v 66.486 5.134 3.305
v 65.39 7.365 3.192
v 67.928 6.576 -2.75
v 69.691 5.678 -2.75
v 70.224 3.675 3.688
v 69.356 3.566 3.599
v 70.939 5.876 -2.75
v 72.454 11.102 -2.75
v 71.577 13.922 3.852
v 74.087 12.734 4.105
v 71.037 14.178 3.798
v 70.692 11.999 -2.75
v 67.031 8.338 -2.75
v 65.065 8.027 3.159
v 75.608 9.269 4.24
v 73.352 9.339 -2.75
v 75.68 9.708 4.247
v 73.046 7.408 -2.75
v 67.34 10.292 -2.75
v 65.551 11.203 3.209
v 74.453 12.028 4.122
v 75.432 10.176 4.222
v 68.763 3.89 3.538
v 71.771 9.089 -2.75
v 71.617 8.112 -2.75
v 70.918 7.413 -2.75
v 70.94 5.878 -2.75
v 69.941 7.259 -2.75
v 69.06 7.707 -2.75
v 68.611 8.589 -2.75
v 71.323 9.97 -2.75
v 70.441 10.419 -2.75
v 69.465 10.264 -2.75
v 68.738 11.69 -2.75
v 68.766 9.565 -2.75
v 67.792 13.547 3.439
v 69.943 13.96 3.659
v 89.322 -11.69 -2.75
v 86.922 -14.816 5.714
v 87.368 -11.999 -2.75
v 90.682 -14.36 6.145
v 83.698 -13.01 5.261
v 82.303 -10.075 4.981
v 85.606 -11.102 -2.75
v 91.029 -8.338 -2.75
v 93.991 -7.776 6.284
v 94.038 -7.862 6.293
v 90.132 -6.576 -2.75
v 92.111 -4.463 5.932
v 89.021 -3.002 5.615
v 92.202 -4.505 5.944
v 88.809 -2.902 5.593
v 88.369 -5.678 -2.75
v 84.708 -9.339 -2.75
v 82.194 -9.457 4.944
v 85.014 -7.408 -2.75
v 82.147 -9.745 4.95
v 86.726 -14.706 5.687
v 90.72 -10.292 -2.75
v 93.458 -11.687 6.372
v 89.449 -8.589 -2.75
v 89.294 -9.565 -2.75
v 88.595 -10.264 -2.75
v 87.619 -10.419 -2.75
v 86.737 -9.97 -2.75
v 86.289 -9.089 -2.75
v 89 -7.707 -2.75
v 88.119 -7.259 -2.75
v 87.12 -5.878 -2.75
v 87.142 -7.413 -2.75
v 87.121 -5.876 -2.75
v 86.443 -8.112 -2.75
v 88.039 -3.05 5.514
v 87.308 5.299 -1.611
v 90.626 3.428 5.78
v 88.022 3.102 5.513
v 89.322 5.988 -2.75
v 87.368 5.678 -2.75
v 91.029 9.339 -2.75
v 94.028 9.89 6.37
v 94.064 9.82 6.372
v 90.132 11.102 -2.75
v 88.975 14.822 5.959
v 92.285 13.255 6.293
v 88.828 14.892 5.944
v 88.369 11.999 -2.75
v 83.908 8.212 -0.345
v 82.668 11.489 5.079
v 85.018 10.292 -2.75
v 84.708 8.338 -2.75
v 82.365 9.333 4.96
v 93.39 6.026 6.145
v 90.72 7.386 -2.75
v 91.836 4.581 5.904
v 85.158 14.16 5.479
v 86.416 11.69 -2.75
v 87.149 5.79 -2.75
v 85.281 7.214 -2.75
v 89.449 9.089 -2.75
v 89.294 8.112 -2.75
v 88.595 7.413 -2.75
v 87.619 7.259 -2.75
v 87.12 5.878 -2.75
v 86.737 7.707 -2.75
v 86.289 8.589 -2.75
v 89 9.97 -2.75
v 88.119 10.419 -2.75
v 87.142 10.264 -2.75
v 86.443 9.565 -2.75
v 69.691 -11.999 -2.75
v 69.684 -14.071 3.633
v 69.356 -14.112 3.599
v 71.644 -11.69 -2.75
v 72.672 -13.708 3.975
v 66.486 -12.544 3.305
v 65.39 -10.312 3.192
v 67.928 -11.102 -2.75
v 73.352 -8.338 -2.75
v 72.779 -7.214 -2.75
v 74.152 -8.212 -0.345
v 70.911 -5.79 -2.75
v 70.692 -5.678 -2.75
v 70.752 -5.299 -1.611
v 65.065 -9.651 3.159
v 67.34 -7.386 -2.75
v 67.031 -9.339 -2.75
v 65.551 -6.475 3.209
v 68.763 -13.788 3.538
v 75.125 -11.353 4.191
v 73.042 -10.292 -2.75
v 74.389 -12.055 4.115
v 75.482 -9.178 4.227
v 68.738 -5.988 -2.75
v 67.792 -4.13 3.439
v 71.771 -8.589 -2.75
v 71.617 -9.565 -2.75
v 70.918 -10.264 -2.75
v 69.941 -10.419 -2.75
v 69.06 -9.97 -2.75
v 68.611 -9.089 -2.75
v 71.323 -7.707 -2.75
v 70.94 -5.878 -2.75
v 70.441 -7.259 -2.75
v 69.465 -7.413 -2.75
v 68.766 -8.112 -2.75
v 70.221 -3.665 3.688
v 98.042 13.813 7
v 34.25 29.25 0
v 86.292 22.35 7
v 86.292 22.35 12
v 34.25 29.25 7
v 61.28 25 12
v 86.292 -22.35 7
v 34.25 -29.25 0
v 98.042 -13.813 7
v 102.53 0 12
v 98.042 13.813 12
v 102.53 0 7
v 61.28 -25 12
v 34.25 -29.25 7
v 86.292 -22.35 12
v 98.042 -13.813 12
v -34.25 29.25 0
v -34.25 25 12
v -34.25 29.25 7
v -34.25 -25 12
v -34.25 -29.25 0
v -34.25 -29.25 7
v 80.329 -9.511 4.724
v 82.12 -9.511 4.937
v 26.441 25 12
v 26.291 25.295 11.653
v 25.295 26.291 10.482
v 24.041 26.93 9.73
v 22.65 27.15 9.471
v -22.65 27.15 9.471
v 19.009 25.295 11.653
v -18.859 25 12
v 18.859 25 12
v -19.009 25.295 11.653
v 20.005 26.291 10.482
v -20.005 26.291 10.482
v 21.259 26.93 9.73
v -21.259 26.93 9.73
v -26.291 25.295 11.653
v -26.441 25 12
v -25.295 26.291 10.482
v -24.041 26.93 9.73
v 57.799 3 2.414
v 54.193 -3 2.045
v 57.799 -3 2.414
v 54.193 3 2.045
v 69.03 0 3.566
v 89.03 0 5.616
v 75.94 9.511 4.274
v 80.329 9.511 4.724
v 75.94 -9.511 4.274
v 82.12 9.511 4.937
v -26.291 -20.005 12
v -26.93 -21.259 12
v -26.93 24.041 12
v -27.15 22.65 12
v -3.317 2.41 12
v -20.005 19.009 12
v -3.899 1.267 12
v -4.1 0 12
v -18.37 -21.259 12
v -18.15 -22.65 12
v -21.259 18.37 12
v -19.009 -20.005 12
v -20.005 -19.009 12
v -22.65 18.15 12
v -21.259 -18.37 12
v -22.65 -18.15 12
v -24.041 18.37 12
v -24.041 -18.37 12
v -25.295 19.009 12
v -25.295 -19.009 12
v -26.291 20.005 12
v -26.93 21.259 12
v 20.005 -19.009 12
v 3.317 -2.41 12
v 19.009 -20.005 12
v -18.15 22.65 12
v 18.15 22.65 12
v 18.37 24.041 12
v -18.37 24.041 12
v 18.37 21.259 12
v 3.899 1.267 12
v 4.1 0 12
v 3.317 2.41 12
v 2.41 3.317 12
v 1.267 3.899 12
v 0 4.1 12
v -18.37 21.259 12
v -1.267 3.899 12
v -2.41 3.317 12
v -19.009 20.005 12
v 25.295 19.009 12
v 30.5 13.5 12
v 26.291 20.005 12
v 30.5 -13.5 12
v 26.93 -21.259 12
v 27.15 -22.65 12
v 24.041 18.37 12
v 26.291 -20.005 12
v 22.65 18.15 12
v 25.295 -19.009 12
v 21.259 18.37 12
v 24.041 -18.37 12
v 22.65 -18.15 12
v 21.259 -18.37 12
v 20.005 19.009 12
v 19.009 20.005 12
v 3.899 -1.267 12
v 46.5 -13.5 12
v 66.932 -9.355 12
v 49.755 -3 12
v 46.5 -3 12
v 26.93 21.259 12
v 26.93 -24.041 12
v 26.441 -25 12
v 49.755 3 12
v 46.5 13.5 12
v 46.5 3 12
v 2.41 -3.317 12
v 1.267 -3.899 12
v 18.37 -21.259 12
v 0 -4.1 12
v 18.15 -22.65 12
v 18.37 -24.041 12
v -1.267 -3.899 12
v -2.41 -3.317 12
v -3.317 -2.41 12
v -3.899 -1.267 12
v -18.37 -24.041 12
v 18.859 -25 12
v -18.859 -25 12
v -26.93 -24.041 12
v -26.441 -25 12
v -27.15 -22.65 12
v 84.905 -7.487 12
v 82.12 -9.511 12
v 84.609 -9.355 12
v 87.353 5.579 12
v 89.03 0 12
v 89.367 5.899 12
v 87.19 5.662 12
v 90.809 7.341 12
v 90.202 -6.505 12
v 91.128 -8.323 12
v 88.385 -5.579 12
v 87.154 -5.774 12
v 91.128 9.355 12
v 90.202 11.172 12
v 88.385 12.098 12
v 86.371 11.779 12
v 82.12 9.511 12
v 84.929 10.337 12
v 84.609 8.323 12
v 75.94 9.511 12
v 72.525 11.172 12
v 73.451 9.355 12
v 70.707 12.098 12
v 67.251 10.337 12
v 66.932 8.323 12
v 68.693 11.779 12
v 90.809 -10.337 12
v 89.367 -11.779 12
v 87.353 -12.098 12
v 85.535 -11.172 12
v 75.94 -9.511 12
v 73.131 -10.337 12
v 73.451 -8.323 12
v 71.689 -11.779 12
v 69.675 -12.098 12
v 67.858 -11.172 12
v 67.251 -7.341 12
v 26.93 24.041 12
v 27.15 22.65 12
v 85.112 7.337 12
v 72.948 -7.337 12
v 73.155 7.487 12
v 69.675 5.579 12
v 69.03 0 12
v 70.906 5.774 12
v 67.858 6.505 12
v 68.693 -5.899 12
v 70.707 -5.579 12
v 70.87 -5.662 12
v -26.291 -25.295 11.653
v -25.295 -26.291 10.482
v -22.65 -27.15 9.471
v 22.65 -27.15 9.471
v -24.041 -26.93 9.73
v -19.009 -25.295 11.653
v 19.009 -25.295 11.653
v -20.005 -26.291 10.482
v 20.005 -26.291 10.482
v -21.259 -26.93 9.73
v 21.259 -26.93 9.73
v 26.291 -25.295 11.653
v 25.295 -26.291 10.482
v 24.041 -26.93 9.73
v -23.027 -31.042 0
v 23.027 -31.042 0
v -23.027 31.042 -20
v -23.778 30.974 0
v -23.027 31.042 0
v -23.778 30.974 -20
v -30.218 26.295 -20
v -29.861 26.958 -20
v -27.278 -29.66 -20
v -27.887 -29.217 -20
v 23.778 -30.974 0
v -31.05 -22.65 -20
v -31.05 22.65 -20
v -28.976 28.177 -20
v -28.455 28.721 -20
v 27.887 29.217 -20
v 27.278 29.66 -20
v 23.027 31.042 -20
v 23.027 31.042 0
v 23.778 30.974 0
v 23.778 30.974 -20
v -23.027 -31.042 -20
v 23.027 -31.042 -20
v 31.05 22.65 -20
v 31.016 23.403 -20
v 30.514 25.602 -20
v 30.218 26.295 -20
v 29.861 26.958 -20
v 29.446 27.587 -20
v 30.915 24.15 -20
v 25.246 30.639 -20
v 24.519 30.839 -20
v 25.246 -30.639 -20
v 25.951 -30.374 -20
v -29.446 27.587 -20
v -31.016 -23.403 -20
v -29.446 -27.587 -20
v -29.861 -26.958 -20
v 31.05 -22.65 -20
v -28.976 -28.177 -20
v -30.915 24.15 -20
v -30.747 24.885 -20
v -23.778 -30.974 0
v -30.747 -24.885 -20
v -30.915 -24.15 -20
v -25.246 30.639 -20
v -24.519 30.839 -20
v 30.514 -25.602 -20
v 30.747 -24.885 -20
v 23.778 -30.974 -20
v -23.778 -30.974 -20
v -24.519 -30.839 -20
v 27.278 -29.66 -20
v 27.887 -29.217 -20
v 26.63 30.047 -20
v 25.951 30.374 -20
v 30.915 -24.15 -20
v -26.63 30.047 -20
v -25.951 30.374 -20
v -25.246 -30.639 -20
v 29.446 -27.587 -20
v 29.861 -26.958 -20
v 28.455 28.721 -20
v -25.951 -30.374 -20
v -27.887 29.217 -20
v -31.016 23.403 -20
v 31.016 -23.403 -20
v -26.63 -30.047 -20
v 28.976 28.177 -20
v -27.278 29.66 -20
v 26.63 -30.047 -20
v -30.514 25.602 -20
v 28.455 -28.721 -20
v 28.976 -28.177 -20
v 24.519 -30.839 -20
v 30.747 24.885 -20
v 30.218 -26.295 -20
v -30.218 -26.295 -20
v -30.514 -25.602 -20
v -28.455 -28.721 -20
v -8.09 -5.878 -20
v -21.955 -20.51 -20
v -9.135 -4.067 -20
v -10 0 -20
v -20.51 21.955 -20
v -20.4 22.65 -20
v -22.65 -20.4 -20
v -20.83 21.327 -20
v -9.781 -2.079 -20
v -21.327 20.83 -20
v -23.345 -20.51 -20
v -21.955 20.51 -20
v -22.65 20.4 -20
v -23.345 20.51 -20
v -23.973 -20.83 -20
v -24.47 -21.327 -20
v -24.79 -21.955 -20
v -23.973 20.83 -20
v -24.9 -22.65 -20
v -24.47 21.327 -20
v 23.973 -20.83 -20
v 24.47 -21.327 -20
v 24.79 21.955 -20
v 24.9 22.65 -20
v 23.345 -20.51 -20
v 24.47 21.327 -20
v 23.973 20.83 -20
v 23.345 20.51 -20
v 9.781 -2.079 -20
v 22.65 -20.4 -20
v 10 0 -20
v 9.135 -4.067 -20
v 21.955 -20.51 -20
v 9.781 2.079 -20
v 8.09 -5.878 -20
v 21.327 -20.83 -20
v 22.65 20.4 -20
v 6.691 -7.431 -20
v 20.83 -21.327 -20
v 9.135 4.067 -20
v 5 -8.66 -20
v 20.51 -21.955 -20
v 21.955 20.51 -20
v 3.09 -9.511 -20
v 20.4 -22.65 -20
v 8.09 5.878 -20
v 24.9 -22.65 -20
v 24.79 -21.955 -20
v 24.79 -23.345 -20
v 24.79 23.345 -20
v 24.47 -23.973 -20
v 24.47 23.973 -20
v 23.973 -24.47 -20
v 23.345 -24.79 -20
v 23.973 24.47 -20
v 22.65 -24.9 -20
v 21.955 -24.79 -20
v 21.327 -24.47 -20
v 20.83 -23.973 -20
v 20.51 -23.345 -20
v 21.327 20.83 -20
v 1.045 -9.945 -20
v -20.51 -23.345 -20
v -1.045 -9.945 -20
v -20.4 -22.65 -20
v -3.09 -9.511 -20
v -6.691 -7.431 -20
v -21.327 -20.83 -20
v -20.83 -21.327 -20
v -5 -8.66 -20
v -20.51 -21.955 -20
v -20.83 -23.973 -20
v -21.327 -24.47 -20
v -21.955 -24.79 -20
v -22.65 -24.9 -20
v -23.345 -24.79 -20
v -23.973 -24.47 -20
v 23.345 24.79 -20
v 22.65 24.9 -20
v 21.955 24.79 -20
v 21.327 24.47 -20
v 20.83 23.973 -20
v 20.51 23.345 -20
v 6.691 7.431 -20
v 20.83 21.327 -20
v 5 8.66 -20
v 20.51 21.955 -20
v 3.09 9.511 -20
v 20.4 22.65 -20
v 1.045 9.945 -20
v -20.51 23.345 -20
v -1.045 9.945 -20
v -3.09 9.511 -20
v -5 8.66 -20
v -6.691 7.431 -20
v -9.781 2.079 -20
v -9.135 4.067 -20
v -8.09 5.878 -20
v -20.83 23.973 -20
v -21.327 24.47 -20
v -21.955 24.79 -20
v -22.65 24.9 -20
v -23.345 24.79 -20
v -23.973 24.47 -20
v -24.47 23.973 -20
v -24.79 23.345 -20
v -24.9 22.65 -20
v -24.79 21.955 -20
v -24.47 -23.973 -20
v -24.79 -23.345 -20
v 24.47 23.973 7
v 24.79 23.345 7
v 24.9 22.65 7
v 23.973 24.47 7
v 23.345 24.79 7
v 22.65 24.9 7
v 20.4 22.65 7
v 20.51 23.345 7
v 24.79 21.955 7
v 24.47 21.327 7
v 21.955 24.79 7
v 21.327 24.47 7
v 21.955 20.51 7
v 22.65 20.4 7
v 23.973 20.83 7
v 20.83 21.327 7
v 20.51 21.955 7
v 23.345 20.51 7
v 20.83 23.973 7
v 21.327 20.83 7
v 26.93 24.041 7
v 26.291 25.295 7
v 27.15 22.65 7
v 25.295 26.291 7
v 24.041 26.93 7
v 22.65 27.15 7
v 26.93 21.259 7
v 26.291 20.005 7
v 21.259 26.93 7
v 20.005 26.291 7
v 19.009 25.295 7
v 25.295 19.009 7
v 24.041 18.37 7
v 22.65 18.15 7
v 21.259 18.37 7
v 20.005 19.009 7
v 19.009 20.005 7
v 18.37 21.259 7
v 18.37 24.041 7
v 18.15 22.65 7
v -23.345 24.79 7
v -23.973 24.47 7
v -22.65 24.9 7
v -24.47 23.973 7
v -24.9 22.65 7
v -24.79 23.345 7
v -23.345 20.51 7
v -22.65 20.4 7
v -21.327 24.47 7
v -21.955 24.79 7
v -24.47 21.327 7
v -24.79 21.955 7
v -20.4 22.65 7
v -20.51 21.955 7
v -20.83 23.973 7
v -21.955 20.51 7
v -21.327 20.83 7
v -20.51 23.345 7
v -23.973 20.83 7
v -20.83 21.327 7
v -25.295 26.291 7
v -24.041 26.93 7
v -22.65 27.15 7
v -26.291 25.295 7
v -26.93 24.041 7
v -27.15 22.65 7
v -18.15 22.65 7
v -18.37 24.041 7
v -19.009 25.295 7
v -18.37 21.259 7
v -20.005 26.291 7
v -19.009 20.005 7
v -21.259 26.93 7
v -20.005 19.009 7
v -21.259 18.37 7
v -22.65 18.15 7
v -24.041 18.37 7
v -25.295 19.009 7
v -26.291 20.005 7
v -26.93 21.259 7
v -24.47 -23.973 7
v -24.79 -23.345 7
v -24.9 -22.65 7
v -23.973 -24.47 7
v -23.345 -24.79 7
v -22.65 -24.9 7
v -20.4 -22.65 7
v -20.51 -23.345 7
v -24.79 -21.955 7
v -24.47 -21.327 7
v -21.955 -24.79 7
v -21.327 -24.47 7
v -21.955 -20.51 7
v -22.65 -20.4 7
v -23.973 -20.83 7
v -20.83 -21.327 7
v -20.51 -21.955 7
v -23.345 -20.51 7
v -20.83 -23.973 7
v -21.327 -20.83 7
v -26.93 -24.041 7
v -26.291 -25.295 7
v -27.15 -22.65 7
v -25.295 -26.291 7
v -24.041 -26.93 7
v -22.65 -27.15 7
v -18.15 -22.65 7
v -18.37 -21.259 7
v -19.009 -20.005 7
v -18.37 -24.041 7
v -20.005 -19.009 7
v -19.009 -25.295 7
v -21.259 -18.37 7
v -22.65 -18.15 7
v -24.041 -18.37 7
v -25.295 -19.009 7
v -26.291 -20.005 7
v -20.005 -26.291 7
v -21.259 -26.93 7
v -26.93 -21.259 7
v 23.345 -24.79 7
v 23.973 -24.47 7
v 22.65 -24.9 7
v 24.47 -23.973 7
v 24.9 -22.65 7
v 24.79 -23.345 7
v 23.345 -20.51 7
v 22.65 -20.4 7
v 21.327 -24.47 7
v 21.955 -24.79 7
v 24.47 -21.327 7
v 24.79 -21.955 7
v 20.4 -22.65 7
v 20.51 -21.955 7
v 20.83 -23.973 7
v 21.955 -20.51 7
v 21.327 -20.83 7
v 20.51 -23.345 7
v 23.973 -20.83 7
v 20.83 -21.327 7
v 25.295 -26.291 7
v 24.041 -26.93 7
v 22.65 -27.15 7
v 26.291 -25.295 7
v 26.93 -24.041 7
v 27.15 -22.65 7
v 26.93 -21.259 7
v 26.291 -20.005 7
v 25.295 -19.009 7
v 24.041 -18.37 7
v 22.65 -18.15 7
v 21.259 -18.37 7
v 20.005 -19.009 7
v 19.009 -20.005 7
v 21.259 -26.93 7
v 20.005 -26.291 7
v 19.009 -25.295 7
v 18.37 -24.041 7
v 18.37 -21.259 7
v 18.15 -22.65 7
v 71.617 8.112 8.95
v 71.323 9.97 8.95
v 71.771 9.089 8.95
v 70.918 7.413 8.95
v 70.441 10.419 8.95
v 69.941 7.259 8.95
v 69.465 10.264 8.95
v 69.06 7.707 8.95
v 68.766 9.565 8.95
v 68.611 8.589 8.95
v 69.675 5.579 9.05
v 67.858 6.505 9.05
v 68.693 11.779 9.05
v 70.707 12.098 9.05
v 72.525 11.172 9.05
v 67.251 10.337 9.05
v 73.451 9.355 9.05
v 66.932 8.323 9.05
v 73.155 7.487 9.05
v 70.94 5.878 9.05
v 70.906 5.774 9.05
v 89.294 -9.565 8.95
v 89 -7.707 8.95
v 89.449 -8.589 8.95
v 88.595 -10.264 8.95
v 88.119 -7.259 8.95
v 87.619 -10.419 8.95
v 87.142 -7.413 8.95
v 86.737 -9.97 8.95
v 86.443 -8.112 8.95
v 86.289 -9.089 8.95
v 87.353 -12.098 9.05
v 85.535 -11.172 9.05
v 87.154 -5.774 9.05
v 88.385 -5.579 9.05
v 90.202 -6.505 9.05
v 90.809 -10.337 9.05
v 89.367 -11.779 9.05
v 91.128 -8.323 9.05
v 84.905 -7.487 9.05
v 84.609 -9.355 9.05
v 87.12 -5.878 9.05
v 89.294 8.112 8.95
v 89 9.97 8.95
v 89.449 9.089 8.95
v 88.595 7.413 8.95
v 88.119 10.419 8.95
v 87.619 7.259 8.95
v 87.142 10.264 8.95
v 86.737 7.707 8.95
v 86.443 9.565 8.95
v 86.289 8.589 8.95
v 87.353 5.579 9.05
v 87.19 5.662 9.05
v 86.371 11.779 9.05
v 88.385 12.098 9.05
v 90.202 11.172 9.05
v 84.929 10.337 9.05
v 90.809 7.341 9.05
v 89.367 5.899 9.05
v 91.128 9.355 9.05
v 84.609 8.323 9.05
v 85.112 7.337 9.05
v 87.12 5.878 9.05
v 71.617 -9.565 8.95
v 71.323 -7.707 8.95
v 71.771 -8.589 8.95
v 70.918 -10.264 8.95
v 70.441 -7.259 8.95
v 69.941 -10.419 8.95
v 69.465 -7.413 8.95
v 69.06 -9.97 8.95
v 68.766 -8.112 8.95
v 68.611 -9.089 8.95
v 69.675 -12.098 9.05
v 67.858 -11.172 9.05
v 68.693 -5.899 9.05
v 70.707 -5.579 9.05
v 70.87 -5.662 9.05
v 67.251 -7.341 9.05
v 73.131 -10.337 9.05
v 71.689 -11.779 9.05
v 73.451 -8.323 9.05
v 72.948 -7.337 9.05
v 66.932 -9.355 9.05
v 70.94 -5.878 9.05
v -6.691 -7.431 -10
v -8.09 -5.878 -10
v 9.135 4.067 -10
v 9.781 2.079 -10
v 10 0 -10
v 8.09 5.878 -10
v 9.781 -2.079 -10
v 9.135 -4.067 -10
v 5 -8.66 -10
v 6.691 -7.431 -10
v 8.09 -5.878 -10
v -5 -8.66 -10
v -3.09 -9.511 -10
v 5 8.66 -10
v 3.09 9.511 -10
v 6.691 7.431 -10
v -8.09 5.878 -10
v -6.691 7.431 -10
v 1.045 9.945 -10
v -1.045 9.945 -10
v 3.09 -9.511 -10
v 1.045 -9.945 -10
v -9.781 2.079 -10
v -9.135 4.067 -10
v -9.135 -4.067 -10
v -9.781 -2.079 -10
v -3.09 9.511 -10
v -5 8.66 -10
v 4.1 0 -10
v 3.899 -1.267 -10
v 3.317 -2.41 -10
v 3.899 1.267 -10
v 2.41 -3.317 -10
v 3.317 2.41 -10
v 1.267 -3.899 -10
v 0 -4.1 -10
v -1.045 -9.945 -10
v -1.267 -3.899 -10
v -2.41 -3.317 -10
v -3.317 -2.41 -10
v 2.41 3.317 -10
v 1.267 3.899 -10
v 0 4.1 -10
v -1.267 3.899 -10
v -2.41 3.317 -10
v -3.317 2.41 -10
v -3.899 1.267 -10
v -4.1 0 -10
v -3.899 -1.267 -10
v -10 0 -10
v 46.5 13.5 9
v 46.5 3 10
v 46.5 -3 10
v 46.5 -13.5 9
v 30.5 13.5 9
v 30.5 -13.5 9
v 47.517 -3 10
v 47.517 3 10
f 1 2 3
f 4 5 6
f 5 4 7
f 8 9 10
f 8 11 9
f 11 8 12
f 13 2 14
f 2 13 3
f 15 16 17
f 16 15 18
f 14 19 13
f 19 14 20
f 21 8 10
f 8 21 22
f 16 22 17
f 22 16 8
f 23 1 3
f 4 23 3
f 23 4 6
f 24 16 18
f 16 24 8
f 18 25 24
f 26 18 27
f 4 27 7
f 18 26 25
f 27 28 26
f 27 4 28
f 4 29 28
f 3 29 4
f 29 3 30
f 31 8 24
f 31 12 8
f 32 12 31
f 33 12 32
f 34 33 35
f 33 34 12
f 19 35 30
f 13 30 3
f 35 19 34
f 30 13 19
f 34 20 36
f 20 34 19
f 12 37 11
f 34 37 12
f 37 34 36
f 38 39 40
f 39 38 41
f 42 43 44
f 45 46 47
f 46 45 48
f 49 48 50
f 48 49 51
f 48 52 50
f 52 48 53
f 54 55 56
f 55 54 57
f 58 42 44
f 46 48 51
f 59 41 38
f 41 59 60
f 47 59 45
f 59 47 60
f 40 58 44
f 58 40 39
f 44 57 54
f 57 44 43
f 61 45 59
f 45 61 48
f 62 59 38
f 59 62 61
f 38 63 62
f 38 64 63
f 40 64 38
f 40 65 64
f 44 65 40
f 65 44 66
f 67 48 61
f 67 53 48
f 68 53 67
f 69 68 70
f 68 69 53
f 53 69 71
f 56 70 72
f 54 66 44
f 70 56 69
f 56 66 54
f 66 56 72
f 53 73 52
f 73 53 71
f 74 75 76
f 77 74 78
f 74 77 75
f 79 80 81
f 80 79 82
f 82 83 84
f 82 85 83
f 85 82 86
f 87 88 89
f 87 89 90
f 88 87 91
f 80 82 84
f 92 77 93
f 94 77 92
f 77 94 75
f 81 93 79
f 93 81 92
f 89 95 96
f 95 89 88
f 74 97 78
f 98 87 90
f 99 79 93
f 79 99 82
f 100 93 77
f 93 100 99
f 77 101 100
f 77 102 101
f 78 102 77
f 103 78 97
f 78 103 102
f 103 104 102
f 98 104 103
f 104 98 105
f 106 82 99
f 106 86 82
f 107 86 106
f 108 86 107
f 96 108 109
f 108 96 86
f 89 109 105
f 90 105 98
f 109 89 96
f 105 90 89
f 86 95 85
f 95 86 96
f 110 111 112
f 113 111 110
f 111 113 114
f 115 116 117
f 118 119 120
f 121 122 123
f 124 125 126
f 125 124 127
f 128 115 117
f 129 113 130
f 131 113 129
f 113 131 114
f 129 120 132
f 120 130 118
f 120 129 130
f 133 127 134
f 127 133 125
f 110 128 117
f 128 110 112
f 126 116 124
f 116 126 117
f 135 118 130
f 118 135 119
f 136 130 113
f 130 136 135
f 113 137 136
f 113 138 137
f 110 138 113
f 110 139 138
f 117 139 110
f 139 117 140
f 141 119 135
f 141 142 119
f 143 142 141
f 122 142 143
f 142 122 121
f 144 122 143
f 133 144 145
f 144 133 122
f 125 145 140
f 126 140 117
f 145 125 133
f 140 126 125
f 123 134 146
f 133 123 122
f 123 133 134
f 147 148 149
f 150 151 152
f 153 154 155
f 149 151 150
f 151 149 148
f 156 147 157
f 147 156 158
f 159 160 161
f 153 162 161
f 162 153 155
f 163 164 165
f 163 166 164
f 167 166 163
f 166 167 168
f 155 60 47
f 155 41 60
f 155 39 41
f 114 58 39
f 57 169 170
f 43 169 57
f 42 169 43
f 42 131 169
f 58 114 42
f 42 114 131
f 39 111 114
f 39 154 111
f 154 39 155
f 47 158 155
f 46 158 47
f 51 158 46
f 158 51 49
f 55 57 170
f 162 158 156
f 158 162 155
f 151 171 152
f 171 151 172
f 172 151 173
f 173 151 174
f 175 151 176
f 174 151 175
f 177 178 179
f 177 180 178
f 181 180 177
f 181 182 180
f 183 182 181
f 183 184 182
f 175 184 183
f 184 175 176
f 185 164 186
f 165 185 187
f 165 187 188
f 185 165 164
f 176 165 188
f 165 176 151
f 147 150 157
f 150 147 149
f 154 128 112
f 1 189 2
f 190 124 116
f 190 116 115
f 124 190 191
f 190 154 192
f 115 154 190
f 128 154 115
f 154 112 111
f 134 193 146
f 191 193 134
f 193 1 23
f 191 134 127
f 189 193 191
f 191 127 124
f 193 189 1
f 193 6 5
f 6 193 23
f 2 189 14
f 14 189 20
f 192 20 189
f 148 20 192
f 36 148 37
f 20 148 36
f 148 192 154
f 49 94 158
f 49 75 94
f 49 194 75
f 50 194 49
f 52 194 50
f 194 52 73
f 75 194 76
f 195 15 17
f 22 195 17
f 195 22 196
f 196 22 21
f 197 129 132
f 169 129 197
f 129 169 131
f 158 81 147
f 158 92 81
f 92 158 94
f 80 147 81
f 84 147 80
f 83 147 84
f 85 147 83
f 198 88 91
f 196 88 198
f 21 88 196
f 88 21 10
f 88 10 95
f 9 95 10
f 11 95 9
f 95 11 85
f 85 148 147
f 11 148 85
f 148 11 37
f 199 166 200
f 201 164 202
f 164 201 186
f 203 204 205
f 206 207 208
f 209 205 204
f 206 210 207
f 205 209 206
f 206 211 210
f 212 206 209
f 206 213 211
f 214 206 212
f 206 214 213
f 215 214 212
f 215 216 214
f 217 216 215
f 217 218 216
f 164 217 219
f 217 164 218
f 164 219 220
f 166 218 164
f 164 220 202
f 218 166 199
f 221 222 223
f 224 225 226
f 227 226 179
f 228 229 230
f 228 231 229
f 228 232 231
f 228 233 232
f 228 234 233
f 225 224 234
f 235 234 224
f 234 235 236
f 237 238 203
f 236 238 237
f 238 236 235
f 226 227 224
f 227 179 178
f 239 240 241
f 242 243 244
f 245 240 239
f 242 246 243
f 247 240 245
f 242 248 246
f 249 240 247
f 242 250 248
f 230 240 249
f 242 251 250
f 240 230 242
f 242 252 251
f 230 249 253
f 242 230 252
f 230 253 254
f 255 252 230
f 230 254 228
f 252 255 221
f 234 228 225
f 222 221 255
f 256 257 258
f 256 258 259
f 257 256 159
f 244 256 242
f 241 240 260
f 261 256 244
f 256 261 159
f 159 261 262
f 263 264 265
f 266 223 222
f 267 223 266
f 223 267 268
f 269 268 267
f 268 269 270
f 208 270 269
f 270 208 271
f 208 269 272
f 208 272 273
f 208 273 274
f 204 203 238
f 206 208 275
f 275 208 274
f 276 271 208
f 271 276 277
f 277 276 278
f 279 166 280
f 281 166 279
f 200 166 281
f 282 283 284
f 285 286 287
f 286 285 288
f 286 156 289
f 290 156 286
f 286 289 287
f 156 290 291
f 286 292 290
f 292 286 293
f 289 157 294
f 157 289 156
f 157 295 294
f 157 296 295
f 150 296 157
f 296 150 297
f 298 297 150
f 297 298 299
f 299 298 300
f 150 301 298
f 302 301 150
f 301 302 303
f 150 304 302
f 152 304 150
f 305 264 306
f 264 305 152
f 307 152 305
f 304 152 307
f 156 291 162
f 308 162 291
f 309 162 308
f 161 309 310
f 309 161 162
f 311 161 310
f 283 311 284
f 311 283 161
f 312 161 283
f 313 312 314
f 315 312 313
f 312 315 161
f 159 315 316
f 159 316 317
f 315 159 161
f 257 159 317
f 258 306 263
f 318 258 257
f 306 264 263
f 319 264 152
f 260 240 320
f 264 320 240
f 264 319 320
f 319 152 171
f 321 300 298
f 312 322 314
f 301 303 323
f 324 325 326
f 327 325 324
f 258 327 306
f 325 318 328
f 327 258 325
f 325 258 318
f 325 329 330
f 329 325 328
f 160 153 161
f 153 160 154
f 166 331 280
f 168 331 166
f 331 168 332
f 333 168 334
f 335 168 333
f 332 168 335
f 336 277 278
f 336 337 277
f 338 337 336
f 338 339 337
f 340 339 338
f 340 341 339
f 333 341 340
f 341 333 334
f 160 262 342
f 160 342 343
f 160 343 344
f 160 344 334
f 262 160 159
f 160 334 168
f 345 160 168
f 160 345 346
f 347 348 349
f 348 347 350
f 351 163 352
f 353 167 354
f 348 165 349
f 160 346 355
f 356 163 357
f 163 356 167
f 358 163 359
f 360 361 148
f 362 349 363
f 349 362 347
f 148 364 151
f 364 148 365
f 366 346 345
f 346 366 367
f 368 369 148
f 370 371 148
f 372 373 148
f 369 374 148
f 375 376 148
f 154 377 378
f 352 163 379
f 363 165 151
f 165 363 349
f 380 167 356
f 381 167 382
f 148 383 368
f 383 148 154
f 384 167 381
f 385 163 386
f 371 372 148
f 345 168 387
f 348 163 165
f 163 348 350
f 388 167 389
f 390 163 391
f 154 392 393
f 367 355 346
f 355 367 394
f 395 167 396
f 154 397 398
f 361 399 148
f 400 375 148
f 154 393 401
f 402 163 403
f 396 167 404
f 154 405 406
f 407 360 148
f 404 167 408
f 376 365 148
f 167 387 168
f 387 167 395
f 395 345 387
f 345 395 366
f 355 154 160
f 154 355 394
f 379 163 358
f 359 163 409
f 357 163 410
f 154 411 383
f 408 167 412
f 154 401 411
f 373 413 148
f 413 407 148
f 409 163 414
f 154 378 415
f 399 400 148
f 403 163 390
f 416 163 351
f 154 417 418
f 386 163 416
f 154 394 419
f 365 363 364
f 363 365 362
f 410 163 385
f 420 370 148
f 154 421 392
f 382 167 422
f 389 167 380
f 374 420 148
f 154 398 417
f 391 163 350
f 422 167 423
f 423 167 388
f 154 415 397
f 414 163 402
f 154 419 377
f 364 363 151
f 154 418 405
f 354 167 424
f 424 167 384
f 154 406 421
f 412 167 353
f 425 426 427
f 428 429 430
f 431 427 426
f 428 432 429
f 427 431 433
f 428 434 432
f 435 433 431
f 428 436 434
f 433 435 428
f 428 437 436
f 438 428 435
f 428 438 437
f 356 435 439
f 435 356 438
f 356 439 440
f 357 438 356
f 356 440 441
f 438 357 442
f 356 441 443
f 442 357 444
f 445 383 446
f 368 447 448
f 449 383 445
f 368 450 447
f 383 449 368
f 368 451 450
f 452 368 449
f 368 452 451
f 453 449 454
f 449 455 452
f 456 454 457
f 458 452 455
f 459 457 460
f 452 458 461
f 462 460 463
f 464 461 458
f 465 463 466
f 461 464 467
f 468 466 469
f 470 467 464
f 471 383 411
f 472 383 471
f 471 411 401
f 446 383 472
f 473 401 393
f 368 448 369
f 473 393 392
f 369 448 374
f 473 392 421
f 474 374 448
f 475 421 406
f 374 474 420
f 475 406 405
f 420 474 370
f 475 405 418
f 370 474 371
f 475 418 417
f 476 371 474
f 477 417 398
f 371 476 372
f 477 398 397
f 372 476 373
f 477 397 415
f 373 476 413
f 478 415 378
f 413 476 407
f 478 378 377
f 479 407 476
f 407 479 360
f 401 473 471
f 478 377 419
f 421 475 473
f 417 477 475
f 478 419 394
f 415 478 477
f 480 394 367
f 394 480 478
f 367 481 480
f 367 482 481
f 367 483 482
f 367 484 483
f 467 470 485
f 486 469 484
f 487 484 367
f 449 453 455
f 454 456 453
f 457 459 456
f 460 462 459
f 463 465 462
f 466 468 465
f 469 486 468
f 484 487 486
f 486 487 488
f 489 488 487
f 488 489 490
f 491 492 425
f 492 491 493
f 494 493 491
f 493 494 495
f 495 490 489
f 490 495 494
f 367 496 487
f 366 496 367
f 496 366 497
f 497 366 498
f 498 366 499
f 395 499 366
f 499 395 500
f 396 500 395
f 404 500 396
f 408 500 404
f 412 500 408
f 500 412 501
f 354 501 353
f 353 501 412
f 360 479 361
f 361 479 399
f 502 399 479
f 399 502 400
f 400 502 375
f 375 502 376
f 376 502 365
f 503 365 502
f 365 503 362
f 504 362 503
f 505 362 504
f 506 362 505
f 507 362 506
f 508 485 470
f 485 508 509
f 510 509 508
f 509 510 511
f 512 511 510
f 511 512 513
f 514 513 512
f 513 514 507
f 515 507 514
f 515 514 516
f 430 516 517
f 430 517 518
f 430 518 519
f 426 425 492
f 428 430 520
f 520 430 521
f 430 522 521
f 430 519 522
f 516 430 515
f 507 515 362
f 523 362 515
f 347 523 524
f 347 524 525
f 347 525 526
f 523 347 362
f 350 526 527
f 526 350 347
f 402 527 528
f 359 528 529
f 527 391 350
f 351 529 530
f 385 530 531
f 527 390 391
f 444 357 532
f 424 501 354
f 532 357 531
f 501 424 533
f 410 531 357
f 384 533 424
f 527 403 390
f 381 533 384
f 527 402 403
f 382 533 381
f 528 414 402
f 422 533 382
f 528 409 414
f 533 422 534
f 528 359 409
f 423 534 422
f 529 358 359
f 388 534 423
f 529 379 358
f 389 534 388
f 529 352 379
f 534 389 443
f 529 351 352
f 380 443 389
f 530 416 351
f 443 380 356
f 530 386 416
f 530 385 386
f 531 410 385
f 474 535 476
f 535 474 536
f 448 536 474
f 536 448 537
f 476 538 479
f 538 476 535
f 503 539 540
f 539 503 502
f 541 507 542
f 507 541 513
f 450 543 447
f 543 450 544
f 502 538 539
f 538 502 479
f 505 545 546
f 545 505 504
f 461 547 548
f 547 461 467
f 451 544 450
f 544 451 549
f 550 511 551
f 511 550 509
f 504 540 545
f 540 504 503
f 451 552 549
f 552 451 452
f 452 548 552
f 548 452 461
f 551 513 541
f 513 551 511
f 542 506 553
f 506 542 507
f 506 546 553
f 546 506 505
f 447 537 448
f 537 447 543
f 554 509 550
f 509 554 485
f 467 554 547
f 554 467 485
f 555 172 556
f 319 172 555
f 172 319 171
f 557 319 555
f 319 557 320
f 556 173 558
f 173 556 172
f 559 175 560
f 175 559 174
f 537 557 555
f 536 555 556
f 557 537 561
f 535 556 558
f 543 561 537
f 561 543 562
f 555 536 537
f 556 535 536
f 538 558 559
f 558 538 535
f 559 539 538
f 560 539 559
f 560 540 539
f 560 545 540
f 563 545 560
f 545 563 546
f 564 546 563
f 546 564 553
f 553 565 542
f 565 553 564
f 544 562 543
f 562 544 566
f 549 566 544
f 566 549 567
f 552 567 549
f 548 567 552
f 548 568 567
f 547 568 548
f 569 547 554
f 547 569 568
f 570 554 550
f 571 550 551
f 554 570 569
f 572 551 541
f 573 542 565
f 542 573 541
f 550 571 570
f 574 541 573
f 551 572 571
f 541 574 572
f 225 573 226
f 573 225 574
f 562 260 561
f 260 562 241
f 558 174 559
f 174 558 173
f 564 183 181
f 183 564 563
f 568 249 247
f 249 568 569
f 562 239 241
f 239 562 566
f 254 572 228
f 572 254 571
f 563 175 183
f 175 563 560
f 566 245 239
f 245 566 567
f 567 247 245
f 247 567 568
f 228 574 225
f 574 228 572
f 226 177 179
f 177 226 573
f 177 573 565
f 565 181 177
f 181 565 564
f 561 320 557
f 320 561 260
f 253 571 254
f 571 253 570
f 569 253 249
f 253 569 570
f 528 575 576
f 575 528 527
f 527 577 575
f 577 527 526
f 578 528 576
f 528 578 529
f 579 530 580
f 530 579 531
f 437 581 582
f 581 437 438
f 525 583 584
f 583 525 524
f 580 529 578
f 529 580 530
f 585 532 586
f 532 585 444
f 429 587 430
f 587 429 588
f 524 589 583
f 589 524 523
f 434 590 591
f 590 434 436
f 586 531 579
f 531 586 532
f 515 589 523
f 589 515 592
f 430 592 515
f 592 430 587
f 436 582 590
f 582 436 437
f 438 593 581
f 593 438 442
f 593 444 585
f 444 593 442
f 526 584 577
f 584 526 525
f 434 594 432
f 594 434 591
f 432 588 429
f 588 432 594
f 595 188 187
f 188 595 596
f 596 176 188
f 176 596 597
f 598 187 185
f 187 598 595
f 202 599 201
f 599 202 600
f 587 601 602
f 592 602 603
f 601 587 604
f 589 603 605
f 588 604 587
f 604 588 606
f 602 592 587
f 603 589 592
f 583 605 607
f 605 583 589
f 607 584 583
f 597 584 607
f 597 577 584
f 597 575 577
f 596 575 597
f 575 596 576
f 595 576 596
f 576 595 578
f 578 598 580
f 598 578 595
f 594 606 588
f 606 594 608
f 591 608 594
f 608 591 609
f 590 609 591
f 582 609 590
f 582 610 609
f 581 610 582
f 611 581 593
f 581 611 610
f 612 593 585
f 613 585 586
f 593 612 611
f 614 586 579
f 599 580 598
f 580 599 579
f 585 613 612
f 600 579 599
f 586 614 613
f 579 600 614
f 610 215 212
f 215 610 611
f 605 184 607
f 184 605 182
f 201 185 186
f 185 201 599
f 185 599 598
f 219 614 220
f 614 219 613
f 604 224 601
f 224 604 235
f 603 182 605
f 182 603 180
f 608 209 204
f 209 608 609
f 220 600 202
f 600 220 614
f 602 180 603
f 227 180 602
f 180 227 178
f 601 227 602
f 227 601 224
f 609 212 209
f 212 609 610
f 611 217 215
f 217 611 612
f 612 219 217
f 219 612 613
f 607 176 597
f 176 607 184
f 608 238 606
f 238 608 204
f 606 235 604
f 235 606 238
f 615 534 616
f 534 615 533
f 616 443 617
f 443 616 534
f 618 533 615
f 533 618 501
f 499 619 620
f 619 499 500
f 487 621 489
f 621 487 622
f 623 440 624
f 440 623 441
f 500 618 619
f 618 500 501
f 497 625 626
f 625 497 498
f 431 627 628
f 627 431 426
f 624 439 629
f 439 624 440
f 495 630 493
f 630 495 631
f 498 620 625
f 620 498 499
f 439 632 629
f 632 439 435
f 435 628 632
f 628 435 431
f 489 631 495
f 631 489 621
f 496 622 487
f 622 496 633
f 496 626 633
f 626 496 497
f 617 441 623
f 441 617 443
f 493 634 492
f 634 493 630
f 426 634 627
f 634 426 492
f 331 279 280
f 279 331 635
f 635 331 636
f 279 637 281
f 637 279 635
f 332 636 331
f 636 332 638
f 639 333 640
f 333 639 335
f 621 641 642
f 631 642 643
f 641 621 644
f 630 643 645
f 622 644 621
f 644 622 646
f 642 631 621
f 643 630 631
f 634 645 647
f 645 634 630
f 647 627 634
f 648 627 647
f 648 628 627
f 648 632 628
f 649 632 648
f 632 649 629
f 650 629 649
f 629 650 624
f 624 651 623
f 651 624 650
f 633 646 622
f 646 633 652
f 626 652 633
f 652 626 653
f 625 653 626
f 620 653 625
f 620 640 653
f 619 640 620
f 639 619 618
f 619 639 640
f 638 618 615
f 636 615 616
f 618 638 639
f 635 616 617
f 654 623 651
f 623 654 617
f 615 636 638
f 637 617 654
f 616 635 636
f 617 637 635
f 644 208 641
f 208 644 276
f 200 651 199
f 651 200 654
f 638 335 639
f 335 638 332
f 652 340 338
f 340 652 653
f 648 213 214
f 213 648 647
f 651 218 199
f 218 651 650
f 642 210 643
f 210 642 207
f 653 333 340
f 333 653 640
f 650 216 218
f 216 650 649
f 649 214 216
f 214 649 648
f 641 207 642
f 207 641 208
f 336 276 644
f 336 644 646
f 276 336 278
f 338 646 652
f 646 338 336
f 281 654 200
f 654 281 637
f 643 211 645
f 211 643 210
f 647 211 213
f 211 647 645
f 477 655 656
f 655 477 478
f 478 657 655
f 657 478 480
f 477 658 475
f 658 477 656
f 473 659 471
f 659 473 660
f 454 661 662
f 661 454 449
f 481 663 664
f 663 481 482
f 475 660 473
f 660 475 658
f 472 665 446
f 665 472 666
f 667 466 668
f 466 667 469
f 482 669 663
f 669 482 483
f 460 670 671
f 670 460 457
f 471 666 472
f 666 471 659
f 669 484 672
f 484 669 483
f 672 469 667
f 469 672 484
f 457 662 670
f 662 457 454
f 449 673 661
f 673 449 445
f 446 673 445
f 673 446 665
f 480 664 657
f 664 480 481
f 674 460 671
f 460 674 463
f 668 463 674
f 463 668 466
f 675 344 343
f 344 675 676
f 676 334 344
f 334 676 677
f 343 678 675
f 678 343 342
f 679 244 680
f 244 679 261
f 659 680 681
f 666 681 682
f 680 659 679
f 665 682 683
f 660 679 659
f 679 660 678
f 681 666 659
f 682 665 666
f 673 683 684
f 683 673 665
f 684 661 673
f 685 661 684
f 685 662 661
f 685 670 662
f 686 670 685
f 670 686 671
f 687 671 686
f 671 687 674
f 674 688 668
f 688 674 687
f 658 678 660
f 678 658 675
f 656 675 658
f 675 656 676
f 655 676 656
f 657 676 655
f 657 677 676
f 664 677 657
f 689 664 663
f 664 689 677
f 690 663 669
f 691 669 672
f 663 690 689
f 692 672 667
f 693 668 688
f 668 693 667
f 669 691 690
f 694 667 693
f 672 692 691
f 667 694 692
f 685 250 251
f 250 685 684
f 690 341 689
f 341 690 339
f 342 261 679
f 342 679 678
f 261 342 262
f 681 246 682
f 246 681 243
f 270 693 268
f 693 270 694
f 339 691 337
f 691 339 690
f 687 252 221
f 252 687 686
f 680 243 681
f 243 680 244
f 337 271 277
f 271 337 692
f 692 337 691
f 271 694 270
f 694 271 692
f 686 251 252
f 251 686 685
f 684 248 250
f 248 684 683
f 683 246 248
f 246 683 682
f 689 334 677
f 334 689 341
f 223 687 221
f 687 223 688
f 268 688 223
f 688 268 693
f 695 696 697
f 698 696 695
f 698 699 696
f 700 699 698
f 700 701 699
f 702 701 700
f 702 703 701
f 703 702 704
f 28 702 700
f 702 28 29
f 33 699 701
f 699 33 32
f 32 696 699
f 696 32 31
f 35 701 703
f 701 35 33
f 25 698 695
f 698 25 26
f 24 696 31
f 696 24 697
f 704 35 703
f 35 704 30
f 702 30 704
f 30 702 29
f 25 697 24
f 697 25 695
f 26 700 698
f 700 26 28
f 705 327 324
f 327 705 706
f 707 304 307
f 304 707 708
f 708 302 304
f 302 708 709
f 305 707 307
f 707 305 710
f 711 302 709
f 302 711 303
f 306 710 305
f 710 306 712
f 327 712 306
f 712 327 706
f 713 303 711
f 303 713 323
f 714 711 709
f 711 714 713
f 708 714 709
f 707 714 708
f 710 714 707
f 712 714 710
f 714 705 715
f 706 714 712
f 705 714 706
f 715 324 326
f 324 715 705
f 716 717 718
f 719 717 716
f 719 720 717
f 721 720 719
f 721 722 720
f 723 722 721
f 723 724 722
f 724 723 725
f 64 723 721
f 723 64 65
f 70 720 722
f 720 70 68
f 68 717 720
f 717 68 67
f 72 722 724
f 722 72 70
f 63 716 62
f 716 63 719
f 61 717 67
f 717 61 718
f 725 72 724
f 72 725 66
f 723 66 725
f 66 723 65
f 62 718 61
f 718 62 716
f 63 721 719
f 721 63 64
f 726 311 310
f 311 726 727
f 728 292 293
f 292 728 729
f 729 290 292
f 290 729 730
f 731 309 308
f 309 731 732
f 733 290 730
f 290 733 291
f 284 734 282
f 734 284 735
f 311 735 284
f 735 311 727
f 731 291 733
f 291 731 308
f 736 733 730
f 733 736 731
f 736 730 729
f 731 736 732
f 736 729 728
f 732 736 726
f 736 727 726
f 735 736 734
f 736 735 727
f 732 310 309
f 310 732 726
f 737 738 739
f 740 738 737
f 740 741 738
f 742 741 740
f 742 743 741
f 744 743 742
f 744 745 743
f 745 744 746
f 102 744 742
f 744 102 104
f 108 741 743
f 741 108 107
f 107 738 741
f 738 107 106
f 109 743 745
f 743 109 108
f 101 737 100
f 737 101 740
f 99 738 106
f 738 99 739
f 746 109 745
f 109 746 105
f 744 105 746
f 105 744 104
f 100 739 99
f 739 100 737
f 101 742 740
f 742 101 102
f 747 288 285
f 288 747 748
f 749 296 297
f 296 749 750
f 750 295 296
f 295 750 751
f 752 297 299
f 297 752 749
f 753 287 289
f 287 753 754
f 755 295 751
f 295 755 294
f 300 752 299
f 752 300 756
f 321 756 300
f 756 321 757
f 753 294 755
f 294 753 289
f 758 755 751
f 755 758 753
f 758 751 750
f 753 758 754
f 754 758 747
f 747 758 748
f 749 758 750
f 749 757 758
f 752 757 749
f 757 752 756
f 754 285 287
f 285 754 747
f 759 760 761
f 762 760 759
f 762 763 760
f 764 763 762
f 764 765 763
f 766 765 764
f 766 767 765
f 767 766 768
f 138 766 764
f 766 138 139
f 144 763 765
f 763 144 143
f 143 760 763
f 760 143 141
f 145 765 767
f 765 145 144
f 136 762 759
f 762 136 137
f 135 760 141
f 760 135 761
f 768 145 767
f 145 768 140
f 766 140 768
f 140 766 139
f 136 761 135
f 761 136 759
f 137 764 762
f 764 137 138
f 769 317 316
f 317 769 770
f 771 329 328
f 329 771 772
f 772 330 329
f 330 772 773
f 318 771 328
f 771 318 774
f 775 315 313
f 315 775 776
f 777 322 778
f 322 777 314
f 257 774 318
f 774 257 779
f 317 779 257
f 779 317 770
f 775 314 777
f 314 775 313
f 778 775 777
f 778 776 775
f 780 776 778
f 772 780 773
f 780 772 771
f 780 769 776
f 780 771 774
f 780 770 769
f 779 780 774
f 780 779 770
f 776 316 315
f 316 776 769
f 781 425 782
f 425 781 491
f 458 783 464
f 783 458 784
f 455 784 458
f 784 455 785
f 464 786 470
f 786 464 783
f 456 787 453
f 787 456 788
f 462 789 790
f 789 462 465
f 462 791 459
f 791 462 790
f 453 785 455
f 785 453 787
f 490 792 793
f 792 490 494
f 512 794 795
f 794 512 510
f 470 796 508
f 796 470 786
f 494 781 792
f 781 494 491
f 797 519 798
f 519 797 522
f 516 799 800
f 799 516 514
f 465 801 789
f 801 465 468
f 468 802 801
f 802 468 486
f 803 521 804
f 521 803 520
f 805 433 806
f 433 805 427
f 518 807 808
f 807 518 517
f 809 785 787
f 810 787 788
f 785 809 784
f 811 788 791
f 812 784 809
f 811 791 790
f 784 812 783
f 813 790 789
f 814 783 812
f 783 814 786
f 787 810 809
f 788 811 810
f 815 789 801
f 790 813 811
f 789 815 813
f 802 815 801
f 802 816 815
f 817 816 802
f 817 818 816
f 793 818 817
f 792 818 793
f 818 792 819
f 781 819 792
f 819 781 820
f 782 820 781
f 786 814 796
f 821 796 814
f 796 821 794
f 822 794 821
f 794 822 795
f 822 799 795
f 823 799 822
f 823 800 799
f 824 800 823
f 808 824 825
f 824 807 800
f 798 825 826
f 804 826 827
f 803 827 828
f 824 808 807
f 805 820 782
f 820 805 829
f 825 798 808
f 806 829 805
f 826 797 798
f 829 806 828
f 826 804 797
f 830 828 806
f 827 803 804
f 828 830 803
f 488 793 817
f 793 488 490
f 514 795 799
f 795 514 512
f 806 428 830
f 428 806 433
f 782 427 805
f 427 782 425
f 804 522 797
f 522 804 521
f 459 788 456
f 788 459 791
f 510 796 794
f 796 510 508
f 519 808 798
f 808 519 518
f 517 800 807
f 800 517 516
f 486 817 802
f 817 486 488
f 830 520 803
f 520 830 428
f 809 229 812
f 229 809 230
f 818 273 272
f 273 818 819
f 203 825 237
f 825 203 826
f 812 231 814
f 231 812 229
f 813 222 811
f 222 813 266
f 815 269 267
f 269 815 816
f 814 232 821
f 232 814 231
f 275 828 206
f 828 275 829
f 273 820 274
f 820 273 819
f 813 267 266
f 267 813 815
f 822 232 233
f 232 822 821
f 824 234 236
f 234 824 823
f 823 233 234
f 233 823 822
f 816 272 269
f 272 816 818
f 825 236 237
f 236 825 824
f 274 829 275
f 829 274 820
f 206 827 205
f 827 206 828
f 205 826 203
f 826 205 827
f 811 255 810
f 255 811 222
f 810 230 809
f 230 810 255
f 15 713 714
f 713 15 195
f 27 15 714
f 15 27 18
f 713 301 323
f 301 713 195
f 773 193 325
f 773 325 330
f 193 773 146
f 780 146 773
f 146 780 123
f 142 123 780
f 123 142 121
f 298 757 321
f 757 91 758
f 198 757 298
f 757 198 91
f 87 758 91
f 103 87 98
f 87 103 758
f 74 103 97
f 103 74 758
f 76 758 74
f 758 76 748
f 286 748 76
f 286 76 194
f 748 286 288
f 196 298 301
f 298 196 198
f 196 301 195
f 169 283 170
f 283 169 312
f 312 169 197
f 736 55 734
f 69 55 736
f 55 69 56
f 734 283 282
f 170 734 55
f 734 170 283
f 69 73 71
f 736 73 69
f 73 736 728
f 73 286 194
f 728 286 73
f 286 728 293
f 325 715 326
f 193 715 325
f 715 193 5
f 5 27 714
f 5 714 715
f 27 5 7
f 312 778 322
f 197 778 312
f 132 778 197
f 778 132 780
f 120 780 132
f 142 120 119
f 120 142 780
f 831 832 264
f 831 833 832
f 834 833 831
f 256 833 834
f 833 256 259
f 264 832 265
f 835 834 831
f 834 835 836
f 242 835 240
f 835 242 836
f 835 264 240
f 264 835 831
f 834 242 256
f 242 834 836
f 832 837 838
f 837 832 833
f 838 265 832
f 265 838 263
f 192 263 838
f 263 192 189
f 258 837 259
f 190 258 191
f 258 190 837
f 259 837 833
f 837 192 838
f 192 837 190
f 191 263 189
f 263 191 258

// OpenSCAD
// file: ../lib/rotor_joint.scad
/*
pro díl do kterého se zastrkávají matky z boku
    rotor_joint(1);

pro díl který obsahuje jen díry na šrouby M4
    rotor_joint(2);

pro díl co má díry na matky ze shora
    rotor_joint(3);
*/


include <../../parameters.scad>

module rotor_joint(mode, thickness=10) {
    module screw_nut_hole() {
        difference() {
            translate([(ALU_profile_width/2+ALU_profile_holder_wall_thickness+M4_screw_diameter), (ALU_profile_width/2+ALU_profile_holder_wall_thickness+M4_screw_diameter), 0])
                cylinder(d=M4_screw_diameter, h=thickness+0.1, center=true, $fn=20);
            translate([(ALU_profile_width/2+ALU_profile_holder_wall_thickness+M4_screw_diameter), (ALU_profile_width/2+ALU_profile_holder_wall_thickness+M4_screw_diameter), thickness/2])
                cylinder(d=M4_screw_diameter, h=1, $fn=20); 
        }

        hull() {
            translate([(ALU_profile_width/2+ALU_profile_holder_wall_thickness+M4_screw_diameter), (ALU_profile_width/2+ALU_profile_holder_wall_thickness+M4_screw_diameter), 0])
                rotate([0, 0, 30])
                    cylinder(d=M4_nut_diameter, h=M4_nut_height, $fn=6, center=true);

            translate([(ALU_profile_width/2+ALU_profile_holder_wall_thickness+M4_screw_diameter), (ALU_profile_width/2+ALU_profile_holder_wall_thickness+M4_screw_diameter)+M4_screw_diameter*2, 0])
                cube([M4_nut_pocket, M4_screw_diameter, M4_nut_height], center=true);
        }
    }

    difference() {
        minkowski() {
            cube([ALU_profile_width+ALU_profile_holder_wall_thickness*2+M4_screw_diameter*2, ALU_profile_width+ALU_profile_holder_wall_thickness*2+M4_screw_diameter*2, thickness/2], center=true);
            cylinder(d=M4_nut_diameter*2, h=thickness/2, $fn=70, center=true);
        }

        if(mode == 1) {
            for(i = [0:90:360]) {
                rotate([0, 0, i])
                    screw_nut_hole();
            }
        }
        else if(mode == 2) {
            for(i = [0:90:360])
            rotate([0, 0, i])
            translate([(ALU_profile_width/2+ALU_profile_holder_wall_thickness+M4_screw_diameter), (ALU_profile_width/2+ALU_profile_holder_wall_thickness+M4_screw_diameter), 0]) {
                cylinder(d=M4_screw_diameter, h=thickness+0.1, $fn=20, center=true);
            }
        }
        else if(mode == 3) {
            for(i = [0:90:360]) {
                rotate([0, 0, i])
                translate([(ALU_profile_width/2+ALU_profile_holder_wall_thickness+M4_screw_diameter), (ALU_profile_width/2+ALU_profile_holder_wall_thickness+M4_screw_diameter), 0]) {
                    cylinder(d=M4_screw_diameter, h=thickness, $fn=20, center=true);
                    translate([0, 0, thickness/2-M4_nut_height+0.1])
                    cylinder(d=M4_nut_diameter, h=M4_nut_height+0.1, $fn=6);
                }
            }
        }
    }
}

rotor_joint(2);
// file: ../../parameters.scad
maximum_printable_size = 150;

layer_thickness = 0.3;
global_clearance = 0.5;

platform_base_diameter = 400; // Průměr ukotvení válců spodní platformy
platform_base_thickness = 20;
platform_cylinder_medium_length = 250;  // délka pneumatického válce s pístem vysunutým do poloviny rozsahu
platform_base_cylinder_spacing = 38;    //rozestupy spodního a horního ukotvení válců.
platform_top_cylinder_spacing = 30;
platform_top_diameter = 150;   // Průměr horní základny (vdálenost od středu základny do středu kulového kloubu ke kterému je uchycen pneumatický válec)


// screw length step - minimum difference in length between two types of screws
basic_screw_length = 5;


//Screw diameter and nut for M10 [mm]
M10_screw_diameter = 10.4;
M10_head_height = 10;
M10_head_diameter = 16+0.5;
M10_nut_height = 10.5;
M10_nut_diameter = 25.5;
M10_nut_pocket = 22.3;

//Screw diameter for M8 [mm]
M8_screw_diameter = 8.6;
M8_head_height = 8;
M8_head_diameter = 13.5;
M8_nut_height = 7.5;
M8_nut_diameter = 14.4 + 0.5;
M8_nut_pocket = 13 + 0.5;
M8_washer_diameter = 16;
M8_washer_thickness = 1.5;


//Screw diameter and nut for M6 [mm]
M6_screw_diameter=6.5;
M6_head_diameter = 10+0.5;
M6_head_height = 6;
M6_nut_height = 4.9;
M6_nut_diameter = 11.8;
M6_nut_pocket = 10.4;
M6_square_nut_height = 3;
M6_square_nut_diameter = 10;

//Screw diameter and nut for M5 [mm]
M5_screw_diameter=5.5;
M5_head_height = 5;
M5_head_diameter = 13+0.5;
M5_nut_height = 4.5;
M5_nut_diameter = 9.4;
M5_nut_pocket = 8.4;

//Screw diameter and nut for M4 [mm]
M4_screw_diameter=4.5;
M4_screw_head_height = 4;
M4_nut_height = 3.2;
M4_nut_diameter = 8.4;
M4_nut_pocket = 7.5;

//Screw diameter and nut for M3 [mm]
M3_screw_diameter = 3.2;
M3_nut_height = 2.7;
M3_nut_diameter = 6.6;
M3_nut_pocket = 5.6;
M3_screw_head_height = 3;

//Screw diameter and nut for M2,5 [mm]
M2_5_screw_diameter = 2.7;
M2_5_nut_height = 2.3;
M2_5_nut_diameter = 6;
M2_5_nut_pocket = 5.5;

// kulove lozisko

bearing_efsm_08_h = 33+1;
bearing_efsm_08_m = 22;
bearing_efsm_08_db = 18;
bearing_efsm_08_ag = 10.5;
bearing_efsm_08_n = M4_screw_diameter;
bearing_efsm_08_a1 = 5.5;
bearing_efsm_08_d = 8.25;
bearing_efsm_08_B = 8; // ball height

bearing_efsm_10_h = 38+1;
bearing_efsm_10_m = 26;
bearing_efsm_10_db = 21.9;
bearing_efsm_10_ag = 12+0.2;
bearing_efsm_10_n = M5_screw_diameter;
bearing_efsm_10_a1 = 6.5;
bearing_efsm_10_d = 10.25;


bearing_efsm_12_width = 40+1;
bearing_efsm_12_h = bearing_efsm_12_width;
bearing_efsm_12_boltd = 28/2; // polovina vzdalenosti mezi srouby
bearing_efsm_12_m = bearing_efsm_12_boltd*2;
bearing_efsm_12_db = 25;
bearing_efsm_12_ag = 13;
bearing_efsm_12_a1 = 7;
bearing_efsm_12_n = M5_screw_diameter;
bearing_efsm_12_d = 12.15;
bearing_efsm_12_B = 10; // ball height
bearing_efsm_space = 1;

bearing_efsm_17_width = 54+1;
bearing_efsm_17_h = bearing_efsm_17_width;
bearing_efsm_17_boltd = 38/2; // polovina vzdalenosti mezi srouby
bearing_efsm_17_m = bearing_efsm_17_boltd*2;
bearing_efsm_17_db = 35;
bearing_efsm_17_ag = 18;
bearing_efsm_17_n = M6_screw_diameter;
bearing_efsm_17_a1 = 10;
bearing_efsm_17_B = 17; // ball height

//limcove lozisko
bearing_EFOM_10_L=26; //celkova sirka zakladny
bearing_EFOM_10_d1=10.3;//diametr otvoru real=10 mm
bearing_EFOM_10_dB=22;//diametr vystupku pro ulozeni lozika
bearing_EFOM_10_H=52;//celková delka zakladny
bearing_EFOM_10_J=36;// hole pitch
bearing_EFOM_10_A1=6.5;//vyska pouzdra
bearing_EFOM_10_Ag=12;//celkova vyska
bearing_EFOM_10_N1=5;//sirka otvoru pro sroub
bearing_EFOM_10_N2=8;//delka otvoru pro sroub
bearing_EFOM_10_m=36;//roztec der pro sroub
bearing_EFOM_10_h=9;//vyska lozika


608_bearing_outer_diameter = 22.3;
608_bearing_inner_diameter = 16;
608_bearing_thickness = 7.1;


// 20 KG servo parameters

servo_20kg_axis_offset = 9.375; // jak je osa mimo stredu
servo_20kg_body_x = 42;
servo_20kg_body_y = 21;
servo_20kg_body_z = 40;
servo_20kg_thread_x = 49/2;
servo_20kg_thread_y = 10/2;
servo_20kg_body_below = 10; // jak hluboko je tělo serva pod drzaky na srouby
servo_20kg_below = 25.8; // jak hluboko je páka serva pod drzaky na srouby

servo_20kg_bolt_d = 2.5+0.3;
servo_20kg_nut_d = 5+0.3;


//strain gauge
strain_gauge_width = 12.7;
strain_gauge_length = 75.1;
strain_gauge_screw_distance = 10;

//ALU profile
ALU_profile_width = 30.3;
ALU_profile_holder_wall_thickness = 3;
ALU_profile_groove_width = 8;

//pillow block bearing
//https://www.igus.eu/product/372
//Part no. KSTM-08
KSTM08_screws_distance = 33;         //m
KSTM08_screws_holes_diameter = 4.5;  //d2
KSTM08_flange_thickness = 6;         //h3
KSTM08_case_width = 9;               //C1
KSTM08_case_length = 47;             //a
KSTM08_ball_width = 12;              //B


//ložiska pro malý rotor
bearing_outer_diameter = 10.2;    // Rozměr B1 v nákresu s přídavkem na toleranci otvoru
bearing_thickness = 4;        // Rozměr B2 v nákresu
//bearing_shaft_length = 19.5;    // Rozměr B3 v nákresu, Originalni hodnota 19.5
bearing_shaft_length = 20;    // Rozměr B3 v nákresu


//parametry víčka s telemetrickou anténou
S01_sila_materialu=1.2;
S01_vyska_horni_zavit=10;
S01_hloubka_zavitu=4;
S01_prumer_vnitrni=50;
LO_spodni_prumer=17.2;
LO_vyska_bez_krytu=15;
S01_tolerance_zavit=1.5;
R01_vyska_prekryti_statoru=10;
// main file
include <../../parameters.scad>
use <../lib/rotor_joint.scad>

module 888_1020(draft = true){


    hall_distance = 35; // distance between axis and magnet

    hall_length = 16;
    hall_length_offset = (11/2-2); // positiv is further from axis
    hall_width = 25+2;
    hall_thickness = 3;

    rotor_axis_diameter = 8.2;


    // 666_1236
    // 666_1007
    // 666_1212
    motor_distance = 79.03; // vzdalenost prerotatoru od hlavni pos_y
    motor_diameter = 35+2;
    motor_axis_diameter = 6.3;
    motor_puller_diameter = 20;
    motor_screw_diameter = M3_screw_diameter;
    motor_mounting_diameter = 25; // vzdalenost protejsich sroubu pro pridelani prerotatoru
    motor_sink = 9.5; // pro zapusteni bez podlozek na motoru...

    plate_overlap =  35; // jak moc velký má být přesah směrem k motoru..

    servo_join_y = 78; // vzdalenost kloubu pro servo
    servo_join_x = 45; // vzdalenost kloubku od osy rotoru
    servo_join_size = 15;

    plate_size_y = 50;
    plate_size_x = plate_overlap + motor_distance + motor_diameter/2;
    plate_size_z = 5;

    plate_bearing_center_distance = 7;


    joint_size_x = 60+0.5; // delka dorazu podle osy x
    joint_size_y = 50+0.5; //delka dorazu podle osy y
    joint_wall_thickness = 4;

    bearing_inner_diameter = 12.2;
    outer_diameter = bearing_efsm_12_d + 3;
    bearing_ball_height = 10.1;
    rim_height = 1;

    back_part_crop = 0;


    joint_size = 20;  //velikost drzaku

    //velikost otvoru pro matku soubu rotoru
    nut_height = 10;
    nut_diameter = 20;

    // pro EFSM-8

    /* bearing_inner_diameter = 8;
    outer_diameter = bearing_efsm_08_d + 3;
    bearing_ball_height = 10.1;
    rim_height = 1; */



      translate([0,0, plate_bearing_center_distance])
        difference(){
            union(){
                hull(){
                    translate([-(joint_size_x + joint_wall_thickness*2)/2 + back_part_crop, -plate_size_y/2, 0])
                        cube([plate_size_x - motor_diameter - back_part_crop, plate_size_y, plate_size_z]);

                    // cast nad motorem
                    translate([motor_distance, 0, 0])
                        cylinder(d = motor_diameter+10, h=plate_size_z, $fn = draft ? 10 : 100);

                    // ramecek pro dil 888_1015
                    translate([-(joint_size_x + joint_wall_thickness*2)/2 + back_part_crop, - (joint_size_y  + joint_wall_thickness*2)/2, -plate_bearing_center_distance])
                        cube([joint_size_x + joint_wall_thickness*2 - back_part_crop, joint_size_y + joint_wall_thickness*2, 7]);

                }
                
                hull() {
                    translate([-(joint_size_x + joint_wall_thickness*2)/2 + back_part_crop, - (joint_size_y  + joint_wall_thickness*2)/2, -plate_bearing_center_distance])
                        cube([joint_size_x + joint_wall_thickness*2 - back_part_crop, joint_size_y + joint_wall_thickness*2, 7]);

                    translate([0, 0 , -plate_bearing_center_distance-joint_size/2])
                        rotor_joint(2, thickness=joint_size);
                }
    // Vymezovaci podlozka pod motor, misto hlinikove 6.5mm silne podlozky
                


                    // Otvory pro pridelani motoru
                    translate([motor_distance, 0, -global_clearance/2])
                        rotate([0,0,45]){
                            for (i=[[0,1],[0,-1],[1,0], [-1,0]]) {
                                translate([i[0]*motor_mounting_diameter/2, i[1]*motor_mounting_diameter/2, -motor_sink]){
                                        cylinder(d2 = M3_screw_diameter*4, d1 = M3_screw_diameter*2, h = motor_sink, $fn = draft?10:60);
                                }
                            }
                        }
            }

            //otvory pro prisroubovani k pripravku
            for(i = [0:90:360]) {
                rotate([0, 0, i])
                translate([(ALU_profile_width/2+ALU_profile_holder_wall_thickness+M4_screw_diameter), (ALU_profile_width/2+ALU_profile_holder_wall_thickness+M4_screw_diameter), 0]) {
                    cylinder(d=M4_screw_diameter, h=300, $fn=20, center=true);
                    cylinder(d=M4_screw_diameter*2, h=200, $fn=20);
                }
            }
            
            //otvor pro matku sroubu rotoru
            translate([0, 0, -joint_size-plate_bearing_center_distance-global_clearance/2])
                cylinder(d=nut_diameter, h=nut_height+global_clearance/2);

            // otvor pro sroub rotoru
            translate([0, 0, -150])
                cylinder(d = rotor_axis_diameter, h = 300, $fn = draft ? 20 : 80);

            // otvor pro osu motoru
            translate([motor_distance, 0, -global_clearance/2-10])
                cylinder(d = motor_axis_diameter, h = plate_size_z + global_clearance + 10, $fn = draft ? 10 : 100);

            // otvor pro  remenici
            translate([motor_distance, 0, -global_clearance/2-10])
                cylinder(d = motor_puller_diameter, h = plate_size_z + global_clearance + 10, $fn = draft ? 10 : 100);


            // Otvory pro pridelani motoru
            translate([motor_distance, 0, -global_clearance/2])
                rotate([0,0,45]){
                    for (i=[[0,1],[0,-1],[1,0], [-1,0]]) {
                        translate([i[0]*motor_mounting_diameter/2, i[1]*motor_mounting_diameter/2, 0]){
                            translate([0,0,-13.3])
                                cylinder(d = motor_screw_diameter, h = plate_size_z + global_clearance + 10, , $fn = draft ? 10 : 50);
                            translate([0,0, plate_bearing_center_distance - 4.7])
                                cylinder(d = M3_nut_diameter, h = M3_screw_head_height, $fn = draft ? 10 : 50);
                        }
                    }
                }


            //Otvor na hallovu sondu
            translate([hall_distance - hall_length/2 + hall_length_offset, -hall_width/2, plate_size_z - hall_thickness])
                cube([hall_length, hall_width, hall_thickness+global_clearance]);


            translate([hall_distance + hall_length/2 + 2, -3,  plate_size_z - hall_thickness+1])
                cube([3, 6, 20]);

            translate([hall_distance + hall_length/2 + 2, -3, - plate_bearing_center_distance])
                translate([0,0, plate_size_z+8])
                    rotate([0,-40,0])
                        translate([0,0,-20])
                            cube([3, 6, 50]);

        }

}
888_1020();
